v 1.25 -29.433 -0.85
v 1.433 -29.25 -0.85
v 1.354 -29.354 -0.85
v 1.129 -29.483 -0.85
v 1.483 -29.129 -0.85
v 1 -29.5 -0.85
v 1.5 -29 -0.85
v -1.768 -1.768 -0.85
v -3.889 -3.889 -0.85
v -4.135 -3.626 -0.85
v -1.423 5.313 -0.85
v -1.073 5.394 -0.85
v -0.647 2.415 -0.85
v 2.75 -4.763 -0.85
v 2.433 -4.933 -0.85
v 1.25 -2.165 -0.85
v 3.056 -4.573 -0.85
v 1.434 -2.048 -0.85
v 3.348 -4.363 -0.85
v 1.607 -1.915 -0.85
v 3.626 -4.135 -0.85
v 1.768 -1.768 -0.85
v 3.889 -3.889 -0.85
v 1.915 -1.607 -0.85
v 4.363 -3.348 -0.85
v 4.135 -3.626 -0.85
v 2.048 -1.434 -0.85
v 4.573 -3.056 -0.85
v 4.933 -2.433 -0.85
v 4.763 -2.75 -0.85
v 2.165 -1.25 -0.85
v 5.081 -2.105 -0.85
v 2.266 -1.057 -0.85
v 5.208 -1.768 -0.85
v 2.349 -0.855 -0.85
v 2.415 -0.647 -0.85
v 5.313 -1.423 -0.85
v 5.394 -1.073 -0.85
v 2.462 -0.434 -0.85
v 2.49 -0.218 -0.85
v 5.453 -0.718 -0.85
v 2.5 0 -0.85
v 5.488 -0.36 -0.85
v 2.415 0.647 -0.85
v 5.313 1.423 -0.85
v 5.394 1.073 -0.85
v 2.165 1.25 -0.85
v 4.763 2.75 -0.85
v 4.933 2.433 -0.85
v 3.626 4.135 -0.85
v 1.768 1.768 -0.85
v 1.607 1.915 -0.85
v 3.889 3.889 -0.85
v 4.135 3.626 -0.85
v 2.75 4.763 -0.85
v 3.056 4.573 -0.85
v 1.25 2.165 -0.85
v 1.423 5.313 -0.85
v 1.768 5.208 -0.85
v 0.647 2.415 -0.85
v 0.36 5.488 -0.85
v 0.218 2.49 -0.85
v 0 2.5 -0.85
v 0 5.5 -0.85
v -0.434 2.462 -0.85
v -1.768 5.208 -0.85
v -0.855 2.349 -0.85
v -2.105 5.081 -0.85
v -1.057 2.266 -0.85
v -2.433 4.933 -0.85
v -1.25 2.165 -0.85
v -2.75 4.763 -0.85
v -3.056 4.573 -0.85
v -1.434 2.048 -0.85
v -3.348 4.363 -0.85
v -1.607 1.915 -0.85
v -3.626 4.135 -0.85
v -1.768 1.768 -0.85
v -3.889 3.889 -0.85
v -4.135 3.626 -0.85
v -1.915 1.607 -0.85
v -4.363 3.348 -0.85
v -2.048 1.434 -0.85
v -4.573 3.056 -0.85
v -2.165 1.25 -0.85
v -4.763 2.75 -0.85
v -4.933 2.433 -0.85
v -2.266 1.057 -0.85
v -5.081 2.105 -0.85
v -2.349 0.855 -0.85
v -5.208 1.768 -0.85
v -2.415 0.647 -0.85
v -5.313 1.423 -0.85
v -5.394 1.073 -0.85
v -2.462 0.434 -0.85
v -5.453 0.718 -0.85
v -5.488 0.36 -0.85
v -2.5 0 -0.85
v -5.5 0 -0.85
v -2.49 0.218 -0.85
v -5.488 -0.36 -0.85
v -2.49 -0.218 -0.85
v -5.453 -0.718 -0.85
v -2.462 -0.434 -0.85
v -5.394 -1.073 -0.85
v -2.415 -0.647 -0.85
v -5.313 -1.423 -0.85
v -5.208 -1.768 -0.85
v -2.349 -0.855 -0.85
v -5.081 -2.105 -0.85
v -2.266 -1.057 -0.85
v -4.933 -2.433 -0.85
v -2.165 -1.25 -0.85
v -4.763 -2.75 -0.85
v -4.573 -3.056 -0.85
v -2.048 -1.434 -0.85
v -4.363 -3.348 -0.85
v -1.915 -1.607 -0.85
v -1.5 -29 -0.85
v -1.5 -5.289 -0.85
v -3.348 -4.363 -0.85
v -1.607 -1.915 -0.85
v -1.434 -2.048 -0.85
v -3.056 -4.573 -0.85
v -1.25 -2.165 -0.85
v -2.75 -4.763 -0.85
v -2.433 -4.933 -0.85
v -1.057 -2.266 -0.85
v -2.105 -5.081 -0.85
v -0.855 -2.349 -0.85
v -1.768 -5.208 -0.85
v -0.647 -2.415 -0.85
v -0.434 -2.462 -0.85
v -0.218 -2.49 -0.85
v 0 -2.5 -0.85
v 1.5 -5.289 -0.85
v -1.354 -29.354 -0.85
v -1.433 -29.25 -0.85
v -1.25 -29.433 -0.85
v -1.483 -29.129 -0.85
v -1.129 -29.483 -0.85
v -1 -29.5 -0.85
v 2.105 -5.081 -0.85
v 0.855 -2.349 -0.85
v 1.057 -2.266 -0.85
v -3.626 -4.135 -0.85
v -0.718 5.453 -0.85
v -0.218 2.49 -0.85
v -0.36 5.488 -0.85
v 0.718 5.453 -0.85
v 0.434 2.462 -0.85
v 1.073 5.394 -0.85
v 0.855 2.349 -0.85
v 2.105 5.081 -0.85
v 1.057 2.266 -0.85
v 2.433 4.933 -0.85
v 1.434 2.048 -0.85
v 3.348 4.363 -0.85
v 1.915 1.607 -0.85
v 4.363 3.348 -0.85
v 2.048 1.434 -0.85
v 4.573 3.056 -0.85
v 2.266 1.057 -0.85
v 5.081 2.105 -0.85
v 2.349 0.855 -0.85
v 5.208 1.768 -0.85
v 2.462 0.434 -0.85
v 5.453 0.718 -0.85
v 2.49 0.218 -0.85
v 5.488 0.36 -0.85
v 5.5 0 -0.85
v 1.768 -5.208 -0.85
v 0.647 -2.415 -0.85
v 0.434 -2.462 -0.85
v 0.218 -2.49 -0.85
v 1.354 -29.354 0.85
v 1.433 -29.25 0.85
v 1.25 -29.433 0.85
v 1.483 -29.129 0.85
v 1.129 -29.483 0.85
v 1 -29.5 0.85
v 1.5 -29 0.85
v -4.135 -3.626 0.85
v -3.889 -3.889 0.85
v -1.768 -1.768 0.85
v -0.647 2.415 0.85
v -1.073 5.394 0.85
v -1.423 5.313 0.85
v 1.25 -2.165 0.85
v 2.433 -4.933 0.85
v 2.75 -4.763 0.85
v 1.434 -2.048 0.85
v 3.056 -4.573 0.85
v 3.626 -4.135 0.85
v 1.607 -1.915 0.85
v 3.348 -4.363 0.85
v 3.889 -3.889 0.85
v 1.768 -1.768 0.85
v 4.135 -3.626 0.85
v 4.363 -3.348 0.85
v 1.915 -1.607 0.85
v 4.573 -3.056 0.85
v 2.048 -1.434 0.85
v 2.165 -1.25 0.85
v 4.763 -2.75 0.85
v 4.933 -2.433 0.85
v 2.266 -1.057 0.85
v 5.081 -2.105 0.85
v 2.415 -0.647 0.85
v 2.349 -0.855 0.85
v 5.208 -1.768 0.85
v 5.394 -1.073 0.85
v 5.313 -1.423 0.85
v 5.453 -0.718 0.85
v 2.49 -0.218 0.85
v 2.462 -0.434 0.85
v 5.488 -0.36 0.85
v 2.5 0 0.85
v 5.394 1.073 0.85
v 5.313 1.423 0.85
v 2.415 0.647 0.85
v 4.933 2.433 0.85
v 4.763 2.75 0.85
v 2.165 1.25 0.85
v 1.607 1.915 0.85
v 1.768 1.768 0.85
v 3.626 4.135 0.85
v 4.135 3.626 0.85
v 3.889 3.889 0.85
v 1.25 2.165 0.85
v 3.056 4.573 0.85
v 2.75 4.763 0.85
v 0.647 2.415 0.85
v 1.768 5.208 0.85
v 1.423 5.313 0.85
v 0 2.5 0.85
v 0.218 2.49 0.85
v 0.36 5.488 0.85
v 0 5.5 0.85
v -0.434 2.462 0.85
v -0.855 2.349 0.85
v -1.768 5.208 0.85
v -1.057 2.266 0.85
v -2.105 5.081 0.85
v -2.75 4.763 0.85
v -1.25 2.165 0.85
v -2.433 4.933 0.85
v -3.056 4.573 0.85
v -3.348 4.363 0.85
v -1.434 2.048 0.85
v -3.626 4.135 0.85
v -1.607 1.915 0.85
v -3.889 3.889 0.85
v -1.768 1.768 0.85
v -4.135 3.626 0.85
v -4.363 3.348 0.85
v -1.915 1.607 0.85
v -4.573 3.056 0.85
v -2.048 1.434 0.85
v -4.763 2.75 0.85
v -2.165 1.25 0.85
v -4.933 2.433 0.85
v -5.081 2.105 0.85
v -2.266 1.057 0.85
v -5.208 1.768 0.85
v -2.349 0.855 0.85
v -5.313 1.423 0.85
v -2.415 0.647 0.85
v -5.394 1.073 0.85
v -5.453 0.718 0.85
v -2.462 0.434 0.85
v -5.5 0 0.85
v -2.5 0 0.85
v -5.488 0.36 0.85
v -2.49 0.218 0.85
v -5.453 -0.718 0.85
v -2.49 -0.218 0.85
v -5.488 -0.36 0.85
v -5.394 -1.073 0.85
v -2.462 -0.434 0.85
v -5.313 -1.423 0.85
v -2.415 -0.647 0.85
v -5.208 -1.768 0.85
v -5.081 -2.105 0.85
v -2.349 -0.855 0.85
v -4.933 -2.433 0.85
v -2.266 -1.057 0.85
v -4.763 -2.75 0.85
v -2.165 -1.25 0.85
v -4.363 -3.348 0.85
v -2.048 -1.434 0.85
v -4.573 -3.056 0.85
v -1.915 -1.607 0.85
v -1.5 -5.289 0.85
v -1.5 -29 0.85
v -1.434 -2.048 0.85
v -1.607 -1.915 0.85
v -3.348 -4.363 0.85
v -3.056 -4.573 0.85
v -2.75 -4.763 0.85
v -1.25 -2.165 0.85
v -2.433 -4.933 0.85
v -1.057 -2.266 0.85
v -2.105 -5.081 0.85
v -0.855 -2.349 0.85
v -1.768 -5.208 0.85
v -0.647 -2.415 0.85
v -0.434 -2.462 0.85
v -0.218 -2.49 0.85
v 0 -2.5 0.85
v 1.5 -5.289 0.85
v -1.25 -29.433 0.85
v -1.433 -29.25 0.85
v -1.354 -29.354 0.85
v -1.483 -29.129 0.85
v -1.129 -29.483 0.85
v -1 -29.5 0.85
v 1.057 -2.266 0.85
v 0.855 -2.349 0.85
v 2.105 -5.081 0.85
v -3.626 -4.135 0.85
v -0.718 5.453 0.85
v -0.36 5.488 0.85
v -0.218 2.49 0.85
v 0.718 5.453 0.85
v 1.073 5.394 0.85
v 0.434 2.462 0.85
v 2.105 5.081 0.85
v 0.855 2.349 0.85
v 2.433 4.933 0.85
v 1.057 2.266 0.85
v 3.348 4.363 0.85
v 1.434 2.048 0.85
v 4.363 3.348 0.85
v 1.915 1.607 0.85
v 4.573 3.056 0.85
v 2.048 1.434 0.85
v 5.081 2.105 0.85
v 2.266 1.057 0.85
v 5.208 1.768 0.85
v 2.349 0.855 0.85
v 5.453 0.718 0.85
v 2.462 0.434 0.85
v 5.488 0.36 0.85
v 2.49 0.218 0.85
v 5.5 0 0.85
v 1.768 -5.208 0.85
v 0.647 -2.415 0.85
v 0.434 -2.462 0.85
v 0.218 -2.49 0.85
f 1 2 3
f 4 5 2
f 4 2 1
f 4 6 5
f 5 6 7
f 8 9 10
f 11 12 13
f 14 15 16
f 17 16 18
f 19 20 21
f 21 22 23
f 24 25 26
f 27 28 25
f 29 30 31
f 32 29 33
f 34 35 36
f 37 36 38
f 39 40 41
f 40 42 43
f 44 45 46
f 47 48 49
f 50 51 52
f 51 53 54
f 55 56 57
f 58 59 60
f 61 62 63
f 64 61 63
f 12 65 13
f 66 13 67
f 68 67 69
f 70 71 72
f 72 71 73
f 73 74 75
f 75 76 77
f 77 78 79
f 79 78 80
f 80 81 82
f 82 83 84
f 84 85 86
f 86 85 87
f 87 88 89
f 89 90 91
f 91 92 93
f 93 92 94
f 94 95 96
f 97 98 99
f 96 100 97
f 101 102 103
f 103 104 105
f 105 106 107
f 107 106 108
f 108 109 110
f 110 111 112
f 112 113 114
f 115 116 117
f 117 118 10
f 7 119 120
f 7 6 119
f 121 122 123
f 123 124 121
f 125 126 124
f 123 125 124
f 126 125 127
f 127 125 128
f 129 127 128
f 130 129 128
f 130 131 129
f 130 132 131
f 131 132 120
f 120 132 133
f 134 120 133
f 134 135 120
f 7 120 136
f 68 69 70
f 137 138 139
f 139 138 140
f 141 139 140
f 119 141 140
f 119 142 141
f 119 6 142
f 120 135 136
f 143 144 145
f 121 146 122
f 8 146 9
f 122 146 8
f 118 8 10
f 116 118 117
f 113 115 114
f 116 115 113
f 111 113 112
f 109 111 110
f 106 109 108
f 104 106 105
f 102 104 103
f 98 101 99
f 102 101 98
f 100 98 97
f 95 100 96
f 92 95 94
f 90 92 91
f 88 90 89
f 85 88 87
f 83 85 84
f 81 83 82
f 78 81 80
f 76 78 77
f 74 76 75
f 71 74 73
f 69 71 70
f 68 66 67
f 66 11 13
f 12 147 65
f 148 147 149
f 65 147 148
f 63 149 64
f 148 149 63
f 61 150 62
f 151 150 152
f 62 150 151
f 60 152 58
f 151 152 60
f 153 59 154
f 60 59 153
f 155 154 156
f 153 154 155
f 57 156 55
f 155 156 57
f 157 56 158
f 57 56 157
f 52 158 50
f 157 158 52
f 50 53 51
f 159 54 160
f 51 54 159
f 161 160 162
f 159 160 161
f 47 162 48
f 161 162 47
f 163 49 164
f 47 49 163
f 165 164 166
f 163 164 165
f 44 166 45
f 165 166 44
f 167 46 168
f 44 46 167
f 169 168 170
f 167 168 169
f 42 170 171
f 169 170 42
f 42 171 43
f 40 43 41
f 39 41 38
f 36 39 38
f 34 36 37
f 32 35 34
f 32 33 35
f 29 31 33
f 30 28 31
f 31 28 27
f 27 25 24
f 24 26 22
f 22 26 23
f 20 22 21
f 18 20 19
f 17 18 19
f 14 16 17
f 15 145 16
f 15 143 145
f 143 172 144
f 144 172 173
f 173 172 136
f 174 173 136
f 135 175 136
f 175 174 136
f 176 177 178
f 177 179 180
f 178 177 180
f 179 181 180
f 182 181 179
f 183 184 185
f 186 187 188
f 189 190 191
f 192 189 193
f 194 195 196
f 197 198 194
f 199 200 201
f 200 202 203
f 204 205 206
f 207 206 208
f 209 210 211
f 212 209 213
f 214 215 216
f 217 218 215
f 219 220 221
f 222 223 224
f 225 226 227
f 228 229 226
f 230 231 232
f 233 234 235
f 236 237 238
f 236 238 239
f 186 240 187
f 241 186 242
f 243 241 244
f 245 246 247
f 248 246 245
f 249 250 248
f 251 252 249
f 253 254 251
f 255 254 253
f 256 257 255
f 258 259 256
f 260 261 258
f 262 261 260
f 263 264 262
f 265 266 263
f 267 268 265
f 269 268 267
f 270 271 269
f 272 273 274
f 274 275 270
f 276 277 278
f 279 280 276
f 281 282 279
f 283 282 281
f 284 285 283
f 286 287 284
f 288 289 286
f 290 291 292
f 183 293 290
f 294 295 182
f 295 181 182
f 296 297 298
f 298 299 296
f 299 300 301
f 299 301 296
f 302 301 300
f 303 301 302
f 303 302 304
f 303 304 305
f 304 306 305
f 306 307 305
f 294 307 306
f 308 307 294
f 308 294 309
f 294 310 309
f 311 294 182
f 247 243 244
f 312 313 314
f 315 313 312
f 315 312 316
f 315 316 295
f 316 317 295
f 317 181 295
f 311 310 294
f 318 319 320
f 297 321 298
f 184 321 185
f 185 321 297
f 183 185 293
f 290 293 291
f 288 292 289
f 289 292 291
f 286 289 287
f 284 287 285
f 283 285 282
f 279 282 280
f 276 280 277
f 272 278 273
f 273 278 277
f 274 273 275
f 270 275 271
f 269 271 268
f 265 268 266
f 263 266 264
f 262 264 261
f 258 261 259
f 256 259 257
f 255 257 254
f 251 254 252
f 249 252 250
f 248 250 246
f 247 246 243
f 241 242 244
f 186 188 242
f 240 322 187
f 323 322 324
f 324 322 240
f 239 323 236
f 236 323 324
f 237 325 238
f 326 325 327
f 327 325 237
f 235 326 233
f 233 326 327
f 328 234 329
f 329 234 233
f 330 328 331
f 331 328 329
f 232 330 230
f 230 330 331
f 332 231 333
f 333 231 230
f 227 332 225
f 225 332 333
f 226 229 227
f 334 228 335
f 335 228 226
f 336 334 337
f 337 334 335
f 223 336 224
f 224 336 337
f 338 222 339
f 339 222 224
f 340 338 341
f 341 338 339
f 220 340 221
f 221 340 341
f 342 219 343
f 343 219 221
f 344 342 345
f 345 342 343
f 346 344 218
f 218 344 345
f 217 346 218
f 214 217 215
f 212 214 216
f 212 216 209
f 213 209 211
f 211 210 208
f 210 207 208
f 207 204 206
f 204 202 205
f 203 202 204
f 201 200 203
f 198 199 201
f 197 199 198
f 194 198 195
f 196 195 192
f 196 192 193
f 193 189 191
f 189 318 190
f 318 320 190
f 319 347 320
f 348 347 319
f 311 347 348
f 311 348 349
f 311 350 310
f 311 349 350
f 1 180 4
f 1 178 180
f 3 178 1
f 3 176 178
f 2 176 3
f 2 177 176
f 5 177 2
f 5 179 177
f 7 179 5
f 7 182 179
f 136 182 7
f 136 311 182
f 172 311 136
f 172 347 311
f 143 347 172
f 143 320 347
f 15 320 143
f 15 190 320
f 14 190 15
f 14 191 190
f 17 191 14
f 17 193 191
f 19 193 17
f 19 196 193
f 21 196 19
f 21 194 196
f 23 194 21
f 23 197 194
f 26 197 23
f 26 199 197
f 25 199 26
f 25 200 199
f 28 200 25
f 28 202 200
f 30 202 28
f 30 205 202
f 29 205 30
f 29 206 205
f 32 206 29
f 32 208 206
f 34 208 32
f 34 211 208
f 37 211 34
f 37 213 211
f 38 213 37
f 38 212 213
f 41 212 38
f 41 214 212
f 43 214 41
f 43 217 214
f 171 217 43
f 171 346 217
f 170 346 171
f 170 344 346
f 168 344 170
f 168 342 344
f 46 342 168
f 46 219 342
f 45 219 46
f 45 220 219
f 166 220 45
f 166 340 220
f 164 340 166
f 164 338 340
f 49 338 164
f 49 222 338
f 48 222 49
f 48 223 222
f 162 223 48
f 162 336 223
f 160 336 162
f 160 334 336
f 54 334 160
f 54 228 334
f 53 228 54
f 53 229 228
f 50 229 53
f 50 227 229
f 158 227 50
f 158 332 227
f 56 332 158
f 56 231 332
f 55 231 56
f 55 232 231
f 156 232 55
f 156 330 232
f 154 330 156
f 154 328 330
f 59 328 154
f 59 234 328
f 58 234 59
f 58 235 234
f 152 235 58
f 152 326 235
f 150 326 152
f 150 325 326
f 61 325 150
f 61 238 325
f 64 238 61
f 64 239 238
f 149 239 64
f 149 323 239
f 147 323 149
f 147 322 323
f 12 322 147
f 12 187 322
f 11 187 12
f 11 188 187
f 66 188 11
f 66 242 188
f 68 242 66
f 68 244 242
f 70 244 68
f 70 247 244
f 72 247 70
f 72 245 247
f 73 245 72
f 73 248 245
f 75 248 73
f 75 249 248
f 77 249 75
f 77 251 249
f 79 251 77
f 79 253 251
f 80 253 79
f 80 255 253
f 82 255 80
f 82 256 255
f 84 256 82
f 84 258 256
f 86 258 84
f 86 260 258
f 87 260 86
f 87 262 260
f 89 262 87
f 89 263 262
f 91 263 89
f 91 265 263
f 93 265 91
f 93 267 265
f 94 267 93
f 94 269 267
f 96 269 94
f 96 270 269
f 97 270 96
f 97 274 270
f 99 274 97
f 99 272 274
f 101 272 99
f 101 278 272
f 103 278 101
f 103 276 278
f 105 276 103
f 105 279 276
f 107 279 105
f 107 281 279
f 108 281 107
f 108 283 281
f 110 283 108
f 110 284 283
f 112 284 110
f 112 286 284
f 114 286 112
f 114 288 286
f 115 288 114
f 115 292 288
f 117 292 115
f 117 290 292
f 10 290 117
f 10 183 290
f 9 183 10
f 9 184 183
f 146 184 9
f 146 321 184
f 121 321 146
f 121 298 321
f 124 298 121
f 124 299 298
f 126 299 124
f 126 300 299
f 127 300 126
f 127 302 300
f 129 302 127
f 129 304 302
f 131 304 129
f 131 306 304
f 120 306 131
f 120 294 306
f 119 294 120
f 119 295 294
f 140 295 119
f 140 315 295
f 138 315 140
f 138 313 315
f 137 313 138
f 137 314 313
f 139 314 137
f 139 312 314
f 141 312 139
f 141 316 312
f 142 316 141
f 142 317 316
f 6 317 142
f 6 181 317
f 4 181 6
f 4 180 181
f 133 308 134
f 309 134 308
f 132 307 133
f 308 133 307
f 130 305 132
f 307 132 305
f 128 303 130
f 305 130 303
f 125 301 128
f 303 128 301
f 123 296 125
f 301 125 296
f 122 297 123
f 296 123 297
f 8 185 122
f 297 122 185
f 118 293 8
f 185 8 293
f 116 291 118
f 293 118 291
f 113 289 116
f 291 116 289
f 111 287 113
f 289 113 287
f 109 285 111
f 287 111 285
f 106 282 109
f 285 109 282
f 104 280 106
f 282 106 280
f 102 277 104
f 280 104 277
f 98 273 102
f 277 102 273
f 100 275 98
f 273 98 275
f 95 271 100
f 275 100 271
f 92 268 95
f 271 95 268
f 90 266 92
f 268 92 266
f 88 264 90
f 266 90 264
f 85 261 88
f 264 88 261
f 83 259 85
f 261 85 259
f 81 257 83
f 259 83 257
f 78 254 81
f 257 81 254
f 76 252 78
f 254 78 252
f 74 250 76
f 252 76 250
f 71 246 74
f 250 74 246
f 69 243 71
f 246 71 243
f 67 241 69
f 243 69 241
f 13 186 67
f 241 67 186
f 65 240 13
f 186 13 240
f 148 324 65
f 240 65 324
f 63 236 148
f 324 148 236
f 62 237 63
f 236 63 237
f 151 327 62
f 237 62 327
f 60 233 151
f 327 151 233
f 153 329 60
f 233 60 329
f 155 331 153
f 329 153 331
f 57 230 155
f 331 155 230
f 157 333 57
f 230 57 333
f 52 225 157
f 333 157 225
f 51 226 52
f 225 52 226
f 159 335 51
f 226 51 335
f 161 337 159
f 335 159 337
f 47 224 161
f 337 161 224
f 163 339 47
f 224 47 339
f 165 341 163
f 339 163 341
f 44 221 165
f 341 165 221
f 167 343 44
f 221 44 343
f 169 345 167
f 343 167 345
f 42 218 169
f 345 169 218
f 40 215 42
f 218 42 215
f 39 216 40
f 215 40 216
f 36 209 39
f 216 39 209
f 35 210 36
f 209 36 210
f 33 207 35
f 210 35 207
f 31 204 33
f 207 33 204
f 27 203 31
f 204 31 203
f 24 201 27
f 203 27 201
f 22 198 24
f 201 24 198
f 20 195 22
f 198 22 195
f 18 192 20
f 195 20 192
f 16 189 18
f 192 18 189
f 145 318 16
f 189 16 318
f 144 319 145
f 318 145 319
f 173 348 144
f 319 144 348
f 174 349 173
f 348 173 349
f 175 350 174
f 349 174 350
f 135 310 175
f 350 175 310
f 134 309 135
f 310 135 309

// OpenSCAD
// part_id: sun16
// name: Sun pointer arm
// source_drawing_ids: DRW-021
// units: mm
// revision: 0.1
// SPDX-License-Identifier: MIT

module sun16_profile_2d(
    center_to_tip = 29.5,
    arm_w = 3.0,
    outer_r = 5.5,
    bore_d = 5.0,
    neck_r = 2.0,
    tip_r = 0.5
) {
    fillet_x = arm_w / 2 + neck_r;
    fillet_y = -sqrt(pow(outer_r + neck_r, 2) - pow(fillet_x, 2));
    stem_top_y = 0;
    stem_bottom_y = -center_to_tip;

    difference() {
        union() {
            circle(r = outer_r, $fn = 96);

            hull() {
                translate([-arm_w / 2 + tip_r, stem_bottom_y + tip_r])
                    circle(r = tip_r, $fn = 24);
                translate([arm_w / 2 - tip_r, stem_bottom_y + tip_r])
                    circle(r = tip_r, $fn = 24);
                translate([-arm_w / 2 + tip_r, stem_top_y - tip_r])
                    circle(r = tip_r, $fn = 24);
                translate([arm_w / 2 - tip_r, stem_top_y - tip_r])
                    circle(r = tip_r, $fn = 24);
            }
        }

        circle(d = bore_d, $fn = 72);

        // Shoulder relief matches the R2 callout where the stem blends into the hub.
        translate([fillet_x, fillet_y]) circle(r = neck_r, $fn = 48);
        translate([-fillet_x, fillet_y]) circle(r = neck_r, $fn = 48);
    }
}

module part_sun16(thickness = 1.7) {
    translate([0, 0, -thickness / 2])
        linear_extrude(height = thickness)
            sun16_profile_2d();
}

// ---- "main guard" ----
if (is_undef(__LIB_MODE__)) {
    part_sun16();
}
